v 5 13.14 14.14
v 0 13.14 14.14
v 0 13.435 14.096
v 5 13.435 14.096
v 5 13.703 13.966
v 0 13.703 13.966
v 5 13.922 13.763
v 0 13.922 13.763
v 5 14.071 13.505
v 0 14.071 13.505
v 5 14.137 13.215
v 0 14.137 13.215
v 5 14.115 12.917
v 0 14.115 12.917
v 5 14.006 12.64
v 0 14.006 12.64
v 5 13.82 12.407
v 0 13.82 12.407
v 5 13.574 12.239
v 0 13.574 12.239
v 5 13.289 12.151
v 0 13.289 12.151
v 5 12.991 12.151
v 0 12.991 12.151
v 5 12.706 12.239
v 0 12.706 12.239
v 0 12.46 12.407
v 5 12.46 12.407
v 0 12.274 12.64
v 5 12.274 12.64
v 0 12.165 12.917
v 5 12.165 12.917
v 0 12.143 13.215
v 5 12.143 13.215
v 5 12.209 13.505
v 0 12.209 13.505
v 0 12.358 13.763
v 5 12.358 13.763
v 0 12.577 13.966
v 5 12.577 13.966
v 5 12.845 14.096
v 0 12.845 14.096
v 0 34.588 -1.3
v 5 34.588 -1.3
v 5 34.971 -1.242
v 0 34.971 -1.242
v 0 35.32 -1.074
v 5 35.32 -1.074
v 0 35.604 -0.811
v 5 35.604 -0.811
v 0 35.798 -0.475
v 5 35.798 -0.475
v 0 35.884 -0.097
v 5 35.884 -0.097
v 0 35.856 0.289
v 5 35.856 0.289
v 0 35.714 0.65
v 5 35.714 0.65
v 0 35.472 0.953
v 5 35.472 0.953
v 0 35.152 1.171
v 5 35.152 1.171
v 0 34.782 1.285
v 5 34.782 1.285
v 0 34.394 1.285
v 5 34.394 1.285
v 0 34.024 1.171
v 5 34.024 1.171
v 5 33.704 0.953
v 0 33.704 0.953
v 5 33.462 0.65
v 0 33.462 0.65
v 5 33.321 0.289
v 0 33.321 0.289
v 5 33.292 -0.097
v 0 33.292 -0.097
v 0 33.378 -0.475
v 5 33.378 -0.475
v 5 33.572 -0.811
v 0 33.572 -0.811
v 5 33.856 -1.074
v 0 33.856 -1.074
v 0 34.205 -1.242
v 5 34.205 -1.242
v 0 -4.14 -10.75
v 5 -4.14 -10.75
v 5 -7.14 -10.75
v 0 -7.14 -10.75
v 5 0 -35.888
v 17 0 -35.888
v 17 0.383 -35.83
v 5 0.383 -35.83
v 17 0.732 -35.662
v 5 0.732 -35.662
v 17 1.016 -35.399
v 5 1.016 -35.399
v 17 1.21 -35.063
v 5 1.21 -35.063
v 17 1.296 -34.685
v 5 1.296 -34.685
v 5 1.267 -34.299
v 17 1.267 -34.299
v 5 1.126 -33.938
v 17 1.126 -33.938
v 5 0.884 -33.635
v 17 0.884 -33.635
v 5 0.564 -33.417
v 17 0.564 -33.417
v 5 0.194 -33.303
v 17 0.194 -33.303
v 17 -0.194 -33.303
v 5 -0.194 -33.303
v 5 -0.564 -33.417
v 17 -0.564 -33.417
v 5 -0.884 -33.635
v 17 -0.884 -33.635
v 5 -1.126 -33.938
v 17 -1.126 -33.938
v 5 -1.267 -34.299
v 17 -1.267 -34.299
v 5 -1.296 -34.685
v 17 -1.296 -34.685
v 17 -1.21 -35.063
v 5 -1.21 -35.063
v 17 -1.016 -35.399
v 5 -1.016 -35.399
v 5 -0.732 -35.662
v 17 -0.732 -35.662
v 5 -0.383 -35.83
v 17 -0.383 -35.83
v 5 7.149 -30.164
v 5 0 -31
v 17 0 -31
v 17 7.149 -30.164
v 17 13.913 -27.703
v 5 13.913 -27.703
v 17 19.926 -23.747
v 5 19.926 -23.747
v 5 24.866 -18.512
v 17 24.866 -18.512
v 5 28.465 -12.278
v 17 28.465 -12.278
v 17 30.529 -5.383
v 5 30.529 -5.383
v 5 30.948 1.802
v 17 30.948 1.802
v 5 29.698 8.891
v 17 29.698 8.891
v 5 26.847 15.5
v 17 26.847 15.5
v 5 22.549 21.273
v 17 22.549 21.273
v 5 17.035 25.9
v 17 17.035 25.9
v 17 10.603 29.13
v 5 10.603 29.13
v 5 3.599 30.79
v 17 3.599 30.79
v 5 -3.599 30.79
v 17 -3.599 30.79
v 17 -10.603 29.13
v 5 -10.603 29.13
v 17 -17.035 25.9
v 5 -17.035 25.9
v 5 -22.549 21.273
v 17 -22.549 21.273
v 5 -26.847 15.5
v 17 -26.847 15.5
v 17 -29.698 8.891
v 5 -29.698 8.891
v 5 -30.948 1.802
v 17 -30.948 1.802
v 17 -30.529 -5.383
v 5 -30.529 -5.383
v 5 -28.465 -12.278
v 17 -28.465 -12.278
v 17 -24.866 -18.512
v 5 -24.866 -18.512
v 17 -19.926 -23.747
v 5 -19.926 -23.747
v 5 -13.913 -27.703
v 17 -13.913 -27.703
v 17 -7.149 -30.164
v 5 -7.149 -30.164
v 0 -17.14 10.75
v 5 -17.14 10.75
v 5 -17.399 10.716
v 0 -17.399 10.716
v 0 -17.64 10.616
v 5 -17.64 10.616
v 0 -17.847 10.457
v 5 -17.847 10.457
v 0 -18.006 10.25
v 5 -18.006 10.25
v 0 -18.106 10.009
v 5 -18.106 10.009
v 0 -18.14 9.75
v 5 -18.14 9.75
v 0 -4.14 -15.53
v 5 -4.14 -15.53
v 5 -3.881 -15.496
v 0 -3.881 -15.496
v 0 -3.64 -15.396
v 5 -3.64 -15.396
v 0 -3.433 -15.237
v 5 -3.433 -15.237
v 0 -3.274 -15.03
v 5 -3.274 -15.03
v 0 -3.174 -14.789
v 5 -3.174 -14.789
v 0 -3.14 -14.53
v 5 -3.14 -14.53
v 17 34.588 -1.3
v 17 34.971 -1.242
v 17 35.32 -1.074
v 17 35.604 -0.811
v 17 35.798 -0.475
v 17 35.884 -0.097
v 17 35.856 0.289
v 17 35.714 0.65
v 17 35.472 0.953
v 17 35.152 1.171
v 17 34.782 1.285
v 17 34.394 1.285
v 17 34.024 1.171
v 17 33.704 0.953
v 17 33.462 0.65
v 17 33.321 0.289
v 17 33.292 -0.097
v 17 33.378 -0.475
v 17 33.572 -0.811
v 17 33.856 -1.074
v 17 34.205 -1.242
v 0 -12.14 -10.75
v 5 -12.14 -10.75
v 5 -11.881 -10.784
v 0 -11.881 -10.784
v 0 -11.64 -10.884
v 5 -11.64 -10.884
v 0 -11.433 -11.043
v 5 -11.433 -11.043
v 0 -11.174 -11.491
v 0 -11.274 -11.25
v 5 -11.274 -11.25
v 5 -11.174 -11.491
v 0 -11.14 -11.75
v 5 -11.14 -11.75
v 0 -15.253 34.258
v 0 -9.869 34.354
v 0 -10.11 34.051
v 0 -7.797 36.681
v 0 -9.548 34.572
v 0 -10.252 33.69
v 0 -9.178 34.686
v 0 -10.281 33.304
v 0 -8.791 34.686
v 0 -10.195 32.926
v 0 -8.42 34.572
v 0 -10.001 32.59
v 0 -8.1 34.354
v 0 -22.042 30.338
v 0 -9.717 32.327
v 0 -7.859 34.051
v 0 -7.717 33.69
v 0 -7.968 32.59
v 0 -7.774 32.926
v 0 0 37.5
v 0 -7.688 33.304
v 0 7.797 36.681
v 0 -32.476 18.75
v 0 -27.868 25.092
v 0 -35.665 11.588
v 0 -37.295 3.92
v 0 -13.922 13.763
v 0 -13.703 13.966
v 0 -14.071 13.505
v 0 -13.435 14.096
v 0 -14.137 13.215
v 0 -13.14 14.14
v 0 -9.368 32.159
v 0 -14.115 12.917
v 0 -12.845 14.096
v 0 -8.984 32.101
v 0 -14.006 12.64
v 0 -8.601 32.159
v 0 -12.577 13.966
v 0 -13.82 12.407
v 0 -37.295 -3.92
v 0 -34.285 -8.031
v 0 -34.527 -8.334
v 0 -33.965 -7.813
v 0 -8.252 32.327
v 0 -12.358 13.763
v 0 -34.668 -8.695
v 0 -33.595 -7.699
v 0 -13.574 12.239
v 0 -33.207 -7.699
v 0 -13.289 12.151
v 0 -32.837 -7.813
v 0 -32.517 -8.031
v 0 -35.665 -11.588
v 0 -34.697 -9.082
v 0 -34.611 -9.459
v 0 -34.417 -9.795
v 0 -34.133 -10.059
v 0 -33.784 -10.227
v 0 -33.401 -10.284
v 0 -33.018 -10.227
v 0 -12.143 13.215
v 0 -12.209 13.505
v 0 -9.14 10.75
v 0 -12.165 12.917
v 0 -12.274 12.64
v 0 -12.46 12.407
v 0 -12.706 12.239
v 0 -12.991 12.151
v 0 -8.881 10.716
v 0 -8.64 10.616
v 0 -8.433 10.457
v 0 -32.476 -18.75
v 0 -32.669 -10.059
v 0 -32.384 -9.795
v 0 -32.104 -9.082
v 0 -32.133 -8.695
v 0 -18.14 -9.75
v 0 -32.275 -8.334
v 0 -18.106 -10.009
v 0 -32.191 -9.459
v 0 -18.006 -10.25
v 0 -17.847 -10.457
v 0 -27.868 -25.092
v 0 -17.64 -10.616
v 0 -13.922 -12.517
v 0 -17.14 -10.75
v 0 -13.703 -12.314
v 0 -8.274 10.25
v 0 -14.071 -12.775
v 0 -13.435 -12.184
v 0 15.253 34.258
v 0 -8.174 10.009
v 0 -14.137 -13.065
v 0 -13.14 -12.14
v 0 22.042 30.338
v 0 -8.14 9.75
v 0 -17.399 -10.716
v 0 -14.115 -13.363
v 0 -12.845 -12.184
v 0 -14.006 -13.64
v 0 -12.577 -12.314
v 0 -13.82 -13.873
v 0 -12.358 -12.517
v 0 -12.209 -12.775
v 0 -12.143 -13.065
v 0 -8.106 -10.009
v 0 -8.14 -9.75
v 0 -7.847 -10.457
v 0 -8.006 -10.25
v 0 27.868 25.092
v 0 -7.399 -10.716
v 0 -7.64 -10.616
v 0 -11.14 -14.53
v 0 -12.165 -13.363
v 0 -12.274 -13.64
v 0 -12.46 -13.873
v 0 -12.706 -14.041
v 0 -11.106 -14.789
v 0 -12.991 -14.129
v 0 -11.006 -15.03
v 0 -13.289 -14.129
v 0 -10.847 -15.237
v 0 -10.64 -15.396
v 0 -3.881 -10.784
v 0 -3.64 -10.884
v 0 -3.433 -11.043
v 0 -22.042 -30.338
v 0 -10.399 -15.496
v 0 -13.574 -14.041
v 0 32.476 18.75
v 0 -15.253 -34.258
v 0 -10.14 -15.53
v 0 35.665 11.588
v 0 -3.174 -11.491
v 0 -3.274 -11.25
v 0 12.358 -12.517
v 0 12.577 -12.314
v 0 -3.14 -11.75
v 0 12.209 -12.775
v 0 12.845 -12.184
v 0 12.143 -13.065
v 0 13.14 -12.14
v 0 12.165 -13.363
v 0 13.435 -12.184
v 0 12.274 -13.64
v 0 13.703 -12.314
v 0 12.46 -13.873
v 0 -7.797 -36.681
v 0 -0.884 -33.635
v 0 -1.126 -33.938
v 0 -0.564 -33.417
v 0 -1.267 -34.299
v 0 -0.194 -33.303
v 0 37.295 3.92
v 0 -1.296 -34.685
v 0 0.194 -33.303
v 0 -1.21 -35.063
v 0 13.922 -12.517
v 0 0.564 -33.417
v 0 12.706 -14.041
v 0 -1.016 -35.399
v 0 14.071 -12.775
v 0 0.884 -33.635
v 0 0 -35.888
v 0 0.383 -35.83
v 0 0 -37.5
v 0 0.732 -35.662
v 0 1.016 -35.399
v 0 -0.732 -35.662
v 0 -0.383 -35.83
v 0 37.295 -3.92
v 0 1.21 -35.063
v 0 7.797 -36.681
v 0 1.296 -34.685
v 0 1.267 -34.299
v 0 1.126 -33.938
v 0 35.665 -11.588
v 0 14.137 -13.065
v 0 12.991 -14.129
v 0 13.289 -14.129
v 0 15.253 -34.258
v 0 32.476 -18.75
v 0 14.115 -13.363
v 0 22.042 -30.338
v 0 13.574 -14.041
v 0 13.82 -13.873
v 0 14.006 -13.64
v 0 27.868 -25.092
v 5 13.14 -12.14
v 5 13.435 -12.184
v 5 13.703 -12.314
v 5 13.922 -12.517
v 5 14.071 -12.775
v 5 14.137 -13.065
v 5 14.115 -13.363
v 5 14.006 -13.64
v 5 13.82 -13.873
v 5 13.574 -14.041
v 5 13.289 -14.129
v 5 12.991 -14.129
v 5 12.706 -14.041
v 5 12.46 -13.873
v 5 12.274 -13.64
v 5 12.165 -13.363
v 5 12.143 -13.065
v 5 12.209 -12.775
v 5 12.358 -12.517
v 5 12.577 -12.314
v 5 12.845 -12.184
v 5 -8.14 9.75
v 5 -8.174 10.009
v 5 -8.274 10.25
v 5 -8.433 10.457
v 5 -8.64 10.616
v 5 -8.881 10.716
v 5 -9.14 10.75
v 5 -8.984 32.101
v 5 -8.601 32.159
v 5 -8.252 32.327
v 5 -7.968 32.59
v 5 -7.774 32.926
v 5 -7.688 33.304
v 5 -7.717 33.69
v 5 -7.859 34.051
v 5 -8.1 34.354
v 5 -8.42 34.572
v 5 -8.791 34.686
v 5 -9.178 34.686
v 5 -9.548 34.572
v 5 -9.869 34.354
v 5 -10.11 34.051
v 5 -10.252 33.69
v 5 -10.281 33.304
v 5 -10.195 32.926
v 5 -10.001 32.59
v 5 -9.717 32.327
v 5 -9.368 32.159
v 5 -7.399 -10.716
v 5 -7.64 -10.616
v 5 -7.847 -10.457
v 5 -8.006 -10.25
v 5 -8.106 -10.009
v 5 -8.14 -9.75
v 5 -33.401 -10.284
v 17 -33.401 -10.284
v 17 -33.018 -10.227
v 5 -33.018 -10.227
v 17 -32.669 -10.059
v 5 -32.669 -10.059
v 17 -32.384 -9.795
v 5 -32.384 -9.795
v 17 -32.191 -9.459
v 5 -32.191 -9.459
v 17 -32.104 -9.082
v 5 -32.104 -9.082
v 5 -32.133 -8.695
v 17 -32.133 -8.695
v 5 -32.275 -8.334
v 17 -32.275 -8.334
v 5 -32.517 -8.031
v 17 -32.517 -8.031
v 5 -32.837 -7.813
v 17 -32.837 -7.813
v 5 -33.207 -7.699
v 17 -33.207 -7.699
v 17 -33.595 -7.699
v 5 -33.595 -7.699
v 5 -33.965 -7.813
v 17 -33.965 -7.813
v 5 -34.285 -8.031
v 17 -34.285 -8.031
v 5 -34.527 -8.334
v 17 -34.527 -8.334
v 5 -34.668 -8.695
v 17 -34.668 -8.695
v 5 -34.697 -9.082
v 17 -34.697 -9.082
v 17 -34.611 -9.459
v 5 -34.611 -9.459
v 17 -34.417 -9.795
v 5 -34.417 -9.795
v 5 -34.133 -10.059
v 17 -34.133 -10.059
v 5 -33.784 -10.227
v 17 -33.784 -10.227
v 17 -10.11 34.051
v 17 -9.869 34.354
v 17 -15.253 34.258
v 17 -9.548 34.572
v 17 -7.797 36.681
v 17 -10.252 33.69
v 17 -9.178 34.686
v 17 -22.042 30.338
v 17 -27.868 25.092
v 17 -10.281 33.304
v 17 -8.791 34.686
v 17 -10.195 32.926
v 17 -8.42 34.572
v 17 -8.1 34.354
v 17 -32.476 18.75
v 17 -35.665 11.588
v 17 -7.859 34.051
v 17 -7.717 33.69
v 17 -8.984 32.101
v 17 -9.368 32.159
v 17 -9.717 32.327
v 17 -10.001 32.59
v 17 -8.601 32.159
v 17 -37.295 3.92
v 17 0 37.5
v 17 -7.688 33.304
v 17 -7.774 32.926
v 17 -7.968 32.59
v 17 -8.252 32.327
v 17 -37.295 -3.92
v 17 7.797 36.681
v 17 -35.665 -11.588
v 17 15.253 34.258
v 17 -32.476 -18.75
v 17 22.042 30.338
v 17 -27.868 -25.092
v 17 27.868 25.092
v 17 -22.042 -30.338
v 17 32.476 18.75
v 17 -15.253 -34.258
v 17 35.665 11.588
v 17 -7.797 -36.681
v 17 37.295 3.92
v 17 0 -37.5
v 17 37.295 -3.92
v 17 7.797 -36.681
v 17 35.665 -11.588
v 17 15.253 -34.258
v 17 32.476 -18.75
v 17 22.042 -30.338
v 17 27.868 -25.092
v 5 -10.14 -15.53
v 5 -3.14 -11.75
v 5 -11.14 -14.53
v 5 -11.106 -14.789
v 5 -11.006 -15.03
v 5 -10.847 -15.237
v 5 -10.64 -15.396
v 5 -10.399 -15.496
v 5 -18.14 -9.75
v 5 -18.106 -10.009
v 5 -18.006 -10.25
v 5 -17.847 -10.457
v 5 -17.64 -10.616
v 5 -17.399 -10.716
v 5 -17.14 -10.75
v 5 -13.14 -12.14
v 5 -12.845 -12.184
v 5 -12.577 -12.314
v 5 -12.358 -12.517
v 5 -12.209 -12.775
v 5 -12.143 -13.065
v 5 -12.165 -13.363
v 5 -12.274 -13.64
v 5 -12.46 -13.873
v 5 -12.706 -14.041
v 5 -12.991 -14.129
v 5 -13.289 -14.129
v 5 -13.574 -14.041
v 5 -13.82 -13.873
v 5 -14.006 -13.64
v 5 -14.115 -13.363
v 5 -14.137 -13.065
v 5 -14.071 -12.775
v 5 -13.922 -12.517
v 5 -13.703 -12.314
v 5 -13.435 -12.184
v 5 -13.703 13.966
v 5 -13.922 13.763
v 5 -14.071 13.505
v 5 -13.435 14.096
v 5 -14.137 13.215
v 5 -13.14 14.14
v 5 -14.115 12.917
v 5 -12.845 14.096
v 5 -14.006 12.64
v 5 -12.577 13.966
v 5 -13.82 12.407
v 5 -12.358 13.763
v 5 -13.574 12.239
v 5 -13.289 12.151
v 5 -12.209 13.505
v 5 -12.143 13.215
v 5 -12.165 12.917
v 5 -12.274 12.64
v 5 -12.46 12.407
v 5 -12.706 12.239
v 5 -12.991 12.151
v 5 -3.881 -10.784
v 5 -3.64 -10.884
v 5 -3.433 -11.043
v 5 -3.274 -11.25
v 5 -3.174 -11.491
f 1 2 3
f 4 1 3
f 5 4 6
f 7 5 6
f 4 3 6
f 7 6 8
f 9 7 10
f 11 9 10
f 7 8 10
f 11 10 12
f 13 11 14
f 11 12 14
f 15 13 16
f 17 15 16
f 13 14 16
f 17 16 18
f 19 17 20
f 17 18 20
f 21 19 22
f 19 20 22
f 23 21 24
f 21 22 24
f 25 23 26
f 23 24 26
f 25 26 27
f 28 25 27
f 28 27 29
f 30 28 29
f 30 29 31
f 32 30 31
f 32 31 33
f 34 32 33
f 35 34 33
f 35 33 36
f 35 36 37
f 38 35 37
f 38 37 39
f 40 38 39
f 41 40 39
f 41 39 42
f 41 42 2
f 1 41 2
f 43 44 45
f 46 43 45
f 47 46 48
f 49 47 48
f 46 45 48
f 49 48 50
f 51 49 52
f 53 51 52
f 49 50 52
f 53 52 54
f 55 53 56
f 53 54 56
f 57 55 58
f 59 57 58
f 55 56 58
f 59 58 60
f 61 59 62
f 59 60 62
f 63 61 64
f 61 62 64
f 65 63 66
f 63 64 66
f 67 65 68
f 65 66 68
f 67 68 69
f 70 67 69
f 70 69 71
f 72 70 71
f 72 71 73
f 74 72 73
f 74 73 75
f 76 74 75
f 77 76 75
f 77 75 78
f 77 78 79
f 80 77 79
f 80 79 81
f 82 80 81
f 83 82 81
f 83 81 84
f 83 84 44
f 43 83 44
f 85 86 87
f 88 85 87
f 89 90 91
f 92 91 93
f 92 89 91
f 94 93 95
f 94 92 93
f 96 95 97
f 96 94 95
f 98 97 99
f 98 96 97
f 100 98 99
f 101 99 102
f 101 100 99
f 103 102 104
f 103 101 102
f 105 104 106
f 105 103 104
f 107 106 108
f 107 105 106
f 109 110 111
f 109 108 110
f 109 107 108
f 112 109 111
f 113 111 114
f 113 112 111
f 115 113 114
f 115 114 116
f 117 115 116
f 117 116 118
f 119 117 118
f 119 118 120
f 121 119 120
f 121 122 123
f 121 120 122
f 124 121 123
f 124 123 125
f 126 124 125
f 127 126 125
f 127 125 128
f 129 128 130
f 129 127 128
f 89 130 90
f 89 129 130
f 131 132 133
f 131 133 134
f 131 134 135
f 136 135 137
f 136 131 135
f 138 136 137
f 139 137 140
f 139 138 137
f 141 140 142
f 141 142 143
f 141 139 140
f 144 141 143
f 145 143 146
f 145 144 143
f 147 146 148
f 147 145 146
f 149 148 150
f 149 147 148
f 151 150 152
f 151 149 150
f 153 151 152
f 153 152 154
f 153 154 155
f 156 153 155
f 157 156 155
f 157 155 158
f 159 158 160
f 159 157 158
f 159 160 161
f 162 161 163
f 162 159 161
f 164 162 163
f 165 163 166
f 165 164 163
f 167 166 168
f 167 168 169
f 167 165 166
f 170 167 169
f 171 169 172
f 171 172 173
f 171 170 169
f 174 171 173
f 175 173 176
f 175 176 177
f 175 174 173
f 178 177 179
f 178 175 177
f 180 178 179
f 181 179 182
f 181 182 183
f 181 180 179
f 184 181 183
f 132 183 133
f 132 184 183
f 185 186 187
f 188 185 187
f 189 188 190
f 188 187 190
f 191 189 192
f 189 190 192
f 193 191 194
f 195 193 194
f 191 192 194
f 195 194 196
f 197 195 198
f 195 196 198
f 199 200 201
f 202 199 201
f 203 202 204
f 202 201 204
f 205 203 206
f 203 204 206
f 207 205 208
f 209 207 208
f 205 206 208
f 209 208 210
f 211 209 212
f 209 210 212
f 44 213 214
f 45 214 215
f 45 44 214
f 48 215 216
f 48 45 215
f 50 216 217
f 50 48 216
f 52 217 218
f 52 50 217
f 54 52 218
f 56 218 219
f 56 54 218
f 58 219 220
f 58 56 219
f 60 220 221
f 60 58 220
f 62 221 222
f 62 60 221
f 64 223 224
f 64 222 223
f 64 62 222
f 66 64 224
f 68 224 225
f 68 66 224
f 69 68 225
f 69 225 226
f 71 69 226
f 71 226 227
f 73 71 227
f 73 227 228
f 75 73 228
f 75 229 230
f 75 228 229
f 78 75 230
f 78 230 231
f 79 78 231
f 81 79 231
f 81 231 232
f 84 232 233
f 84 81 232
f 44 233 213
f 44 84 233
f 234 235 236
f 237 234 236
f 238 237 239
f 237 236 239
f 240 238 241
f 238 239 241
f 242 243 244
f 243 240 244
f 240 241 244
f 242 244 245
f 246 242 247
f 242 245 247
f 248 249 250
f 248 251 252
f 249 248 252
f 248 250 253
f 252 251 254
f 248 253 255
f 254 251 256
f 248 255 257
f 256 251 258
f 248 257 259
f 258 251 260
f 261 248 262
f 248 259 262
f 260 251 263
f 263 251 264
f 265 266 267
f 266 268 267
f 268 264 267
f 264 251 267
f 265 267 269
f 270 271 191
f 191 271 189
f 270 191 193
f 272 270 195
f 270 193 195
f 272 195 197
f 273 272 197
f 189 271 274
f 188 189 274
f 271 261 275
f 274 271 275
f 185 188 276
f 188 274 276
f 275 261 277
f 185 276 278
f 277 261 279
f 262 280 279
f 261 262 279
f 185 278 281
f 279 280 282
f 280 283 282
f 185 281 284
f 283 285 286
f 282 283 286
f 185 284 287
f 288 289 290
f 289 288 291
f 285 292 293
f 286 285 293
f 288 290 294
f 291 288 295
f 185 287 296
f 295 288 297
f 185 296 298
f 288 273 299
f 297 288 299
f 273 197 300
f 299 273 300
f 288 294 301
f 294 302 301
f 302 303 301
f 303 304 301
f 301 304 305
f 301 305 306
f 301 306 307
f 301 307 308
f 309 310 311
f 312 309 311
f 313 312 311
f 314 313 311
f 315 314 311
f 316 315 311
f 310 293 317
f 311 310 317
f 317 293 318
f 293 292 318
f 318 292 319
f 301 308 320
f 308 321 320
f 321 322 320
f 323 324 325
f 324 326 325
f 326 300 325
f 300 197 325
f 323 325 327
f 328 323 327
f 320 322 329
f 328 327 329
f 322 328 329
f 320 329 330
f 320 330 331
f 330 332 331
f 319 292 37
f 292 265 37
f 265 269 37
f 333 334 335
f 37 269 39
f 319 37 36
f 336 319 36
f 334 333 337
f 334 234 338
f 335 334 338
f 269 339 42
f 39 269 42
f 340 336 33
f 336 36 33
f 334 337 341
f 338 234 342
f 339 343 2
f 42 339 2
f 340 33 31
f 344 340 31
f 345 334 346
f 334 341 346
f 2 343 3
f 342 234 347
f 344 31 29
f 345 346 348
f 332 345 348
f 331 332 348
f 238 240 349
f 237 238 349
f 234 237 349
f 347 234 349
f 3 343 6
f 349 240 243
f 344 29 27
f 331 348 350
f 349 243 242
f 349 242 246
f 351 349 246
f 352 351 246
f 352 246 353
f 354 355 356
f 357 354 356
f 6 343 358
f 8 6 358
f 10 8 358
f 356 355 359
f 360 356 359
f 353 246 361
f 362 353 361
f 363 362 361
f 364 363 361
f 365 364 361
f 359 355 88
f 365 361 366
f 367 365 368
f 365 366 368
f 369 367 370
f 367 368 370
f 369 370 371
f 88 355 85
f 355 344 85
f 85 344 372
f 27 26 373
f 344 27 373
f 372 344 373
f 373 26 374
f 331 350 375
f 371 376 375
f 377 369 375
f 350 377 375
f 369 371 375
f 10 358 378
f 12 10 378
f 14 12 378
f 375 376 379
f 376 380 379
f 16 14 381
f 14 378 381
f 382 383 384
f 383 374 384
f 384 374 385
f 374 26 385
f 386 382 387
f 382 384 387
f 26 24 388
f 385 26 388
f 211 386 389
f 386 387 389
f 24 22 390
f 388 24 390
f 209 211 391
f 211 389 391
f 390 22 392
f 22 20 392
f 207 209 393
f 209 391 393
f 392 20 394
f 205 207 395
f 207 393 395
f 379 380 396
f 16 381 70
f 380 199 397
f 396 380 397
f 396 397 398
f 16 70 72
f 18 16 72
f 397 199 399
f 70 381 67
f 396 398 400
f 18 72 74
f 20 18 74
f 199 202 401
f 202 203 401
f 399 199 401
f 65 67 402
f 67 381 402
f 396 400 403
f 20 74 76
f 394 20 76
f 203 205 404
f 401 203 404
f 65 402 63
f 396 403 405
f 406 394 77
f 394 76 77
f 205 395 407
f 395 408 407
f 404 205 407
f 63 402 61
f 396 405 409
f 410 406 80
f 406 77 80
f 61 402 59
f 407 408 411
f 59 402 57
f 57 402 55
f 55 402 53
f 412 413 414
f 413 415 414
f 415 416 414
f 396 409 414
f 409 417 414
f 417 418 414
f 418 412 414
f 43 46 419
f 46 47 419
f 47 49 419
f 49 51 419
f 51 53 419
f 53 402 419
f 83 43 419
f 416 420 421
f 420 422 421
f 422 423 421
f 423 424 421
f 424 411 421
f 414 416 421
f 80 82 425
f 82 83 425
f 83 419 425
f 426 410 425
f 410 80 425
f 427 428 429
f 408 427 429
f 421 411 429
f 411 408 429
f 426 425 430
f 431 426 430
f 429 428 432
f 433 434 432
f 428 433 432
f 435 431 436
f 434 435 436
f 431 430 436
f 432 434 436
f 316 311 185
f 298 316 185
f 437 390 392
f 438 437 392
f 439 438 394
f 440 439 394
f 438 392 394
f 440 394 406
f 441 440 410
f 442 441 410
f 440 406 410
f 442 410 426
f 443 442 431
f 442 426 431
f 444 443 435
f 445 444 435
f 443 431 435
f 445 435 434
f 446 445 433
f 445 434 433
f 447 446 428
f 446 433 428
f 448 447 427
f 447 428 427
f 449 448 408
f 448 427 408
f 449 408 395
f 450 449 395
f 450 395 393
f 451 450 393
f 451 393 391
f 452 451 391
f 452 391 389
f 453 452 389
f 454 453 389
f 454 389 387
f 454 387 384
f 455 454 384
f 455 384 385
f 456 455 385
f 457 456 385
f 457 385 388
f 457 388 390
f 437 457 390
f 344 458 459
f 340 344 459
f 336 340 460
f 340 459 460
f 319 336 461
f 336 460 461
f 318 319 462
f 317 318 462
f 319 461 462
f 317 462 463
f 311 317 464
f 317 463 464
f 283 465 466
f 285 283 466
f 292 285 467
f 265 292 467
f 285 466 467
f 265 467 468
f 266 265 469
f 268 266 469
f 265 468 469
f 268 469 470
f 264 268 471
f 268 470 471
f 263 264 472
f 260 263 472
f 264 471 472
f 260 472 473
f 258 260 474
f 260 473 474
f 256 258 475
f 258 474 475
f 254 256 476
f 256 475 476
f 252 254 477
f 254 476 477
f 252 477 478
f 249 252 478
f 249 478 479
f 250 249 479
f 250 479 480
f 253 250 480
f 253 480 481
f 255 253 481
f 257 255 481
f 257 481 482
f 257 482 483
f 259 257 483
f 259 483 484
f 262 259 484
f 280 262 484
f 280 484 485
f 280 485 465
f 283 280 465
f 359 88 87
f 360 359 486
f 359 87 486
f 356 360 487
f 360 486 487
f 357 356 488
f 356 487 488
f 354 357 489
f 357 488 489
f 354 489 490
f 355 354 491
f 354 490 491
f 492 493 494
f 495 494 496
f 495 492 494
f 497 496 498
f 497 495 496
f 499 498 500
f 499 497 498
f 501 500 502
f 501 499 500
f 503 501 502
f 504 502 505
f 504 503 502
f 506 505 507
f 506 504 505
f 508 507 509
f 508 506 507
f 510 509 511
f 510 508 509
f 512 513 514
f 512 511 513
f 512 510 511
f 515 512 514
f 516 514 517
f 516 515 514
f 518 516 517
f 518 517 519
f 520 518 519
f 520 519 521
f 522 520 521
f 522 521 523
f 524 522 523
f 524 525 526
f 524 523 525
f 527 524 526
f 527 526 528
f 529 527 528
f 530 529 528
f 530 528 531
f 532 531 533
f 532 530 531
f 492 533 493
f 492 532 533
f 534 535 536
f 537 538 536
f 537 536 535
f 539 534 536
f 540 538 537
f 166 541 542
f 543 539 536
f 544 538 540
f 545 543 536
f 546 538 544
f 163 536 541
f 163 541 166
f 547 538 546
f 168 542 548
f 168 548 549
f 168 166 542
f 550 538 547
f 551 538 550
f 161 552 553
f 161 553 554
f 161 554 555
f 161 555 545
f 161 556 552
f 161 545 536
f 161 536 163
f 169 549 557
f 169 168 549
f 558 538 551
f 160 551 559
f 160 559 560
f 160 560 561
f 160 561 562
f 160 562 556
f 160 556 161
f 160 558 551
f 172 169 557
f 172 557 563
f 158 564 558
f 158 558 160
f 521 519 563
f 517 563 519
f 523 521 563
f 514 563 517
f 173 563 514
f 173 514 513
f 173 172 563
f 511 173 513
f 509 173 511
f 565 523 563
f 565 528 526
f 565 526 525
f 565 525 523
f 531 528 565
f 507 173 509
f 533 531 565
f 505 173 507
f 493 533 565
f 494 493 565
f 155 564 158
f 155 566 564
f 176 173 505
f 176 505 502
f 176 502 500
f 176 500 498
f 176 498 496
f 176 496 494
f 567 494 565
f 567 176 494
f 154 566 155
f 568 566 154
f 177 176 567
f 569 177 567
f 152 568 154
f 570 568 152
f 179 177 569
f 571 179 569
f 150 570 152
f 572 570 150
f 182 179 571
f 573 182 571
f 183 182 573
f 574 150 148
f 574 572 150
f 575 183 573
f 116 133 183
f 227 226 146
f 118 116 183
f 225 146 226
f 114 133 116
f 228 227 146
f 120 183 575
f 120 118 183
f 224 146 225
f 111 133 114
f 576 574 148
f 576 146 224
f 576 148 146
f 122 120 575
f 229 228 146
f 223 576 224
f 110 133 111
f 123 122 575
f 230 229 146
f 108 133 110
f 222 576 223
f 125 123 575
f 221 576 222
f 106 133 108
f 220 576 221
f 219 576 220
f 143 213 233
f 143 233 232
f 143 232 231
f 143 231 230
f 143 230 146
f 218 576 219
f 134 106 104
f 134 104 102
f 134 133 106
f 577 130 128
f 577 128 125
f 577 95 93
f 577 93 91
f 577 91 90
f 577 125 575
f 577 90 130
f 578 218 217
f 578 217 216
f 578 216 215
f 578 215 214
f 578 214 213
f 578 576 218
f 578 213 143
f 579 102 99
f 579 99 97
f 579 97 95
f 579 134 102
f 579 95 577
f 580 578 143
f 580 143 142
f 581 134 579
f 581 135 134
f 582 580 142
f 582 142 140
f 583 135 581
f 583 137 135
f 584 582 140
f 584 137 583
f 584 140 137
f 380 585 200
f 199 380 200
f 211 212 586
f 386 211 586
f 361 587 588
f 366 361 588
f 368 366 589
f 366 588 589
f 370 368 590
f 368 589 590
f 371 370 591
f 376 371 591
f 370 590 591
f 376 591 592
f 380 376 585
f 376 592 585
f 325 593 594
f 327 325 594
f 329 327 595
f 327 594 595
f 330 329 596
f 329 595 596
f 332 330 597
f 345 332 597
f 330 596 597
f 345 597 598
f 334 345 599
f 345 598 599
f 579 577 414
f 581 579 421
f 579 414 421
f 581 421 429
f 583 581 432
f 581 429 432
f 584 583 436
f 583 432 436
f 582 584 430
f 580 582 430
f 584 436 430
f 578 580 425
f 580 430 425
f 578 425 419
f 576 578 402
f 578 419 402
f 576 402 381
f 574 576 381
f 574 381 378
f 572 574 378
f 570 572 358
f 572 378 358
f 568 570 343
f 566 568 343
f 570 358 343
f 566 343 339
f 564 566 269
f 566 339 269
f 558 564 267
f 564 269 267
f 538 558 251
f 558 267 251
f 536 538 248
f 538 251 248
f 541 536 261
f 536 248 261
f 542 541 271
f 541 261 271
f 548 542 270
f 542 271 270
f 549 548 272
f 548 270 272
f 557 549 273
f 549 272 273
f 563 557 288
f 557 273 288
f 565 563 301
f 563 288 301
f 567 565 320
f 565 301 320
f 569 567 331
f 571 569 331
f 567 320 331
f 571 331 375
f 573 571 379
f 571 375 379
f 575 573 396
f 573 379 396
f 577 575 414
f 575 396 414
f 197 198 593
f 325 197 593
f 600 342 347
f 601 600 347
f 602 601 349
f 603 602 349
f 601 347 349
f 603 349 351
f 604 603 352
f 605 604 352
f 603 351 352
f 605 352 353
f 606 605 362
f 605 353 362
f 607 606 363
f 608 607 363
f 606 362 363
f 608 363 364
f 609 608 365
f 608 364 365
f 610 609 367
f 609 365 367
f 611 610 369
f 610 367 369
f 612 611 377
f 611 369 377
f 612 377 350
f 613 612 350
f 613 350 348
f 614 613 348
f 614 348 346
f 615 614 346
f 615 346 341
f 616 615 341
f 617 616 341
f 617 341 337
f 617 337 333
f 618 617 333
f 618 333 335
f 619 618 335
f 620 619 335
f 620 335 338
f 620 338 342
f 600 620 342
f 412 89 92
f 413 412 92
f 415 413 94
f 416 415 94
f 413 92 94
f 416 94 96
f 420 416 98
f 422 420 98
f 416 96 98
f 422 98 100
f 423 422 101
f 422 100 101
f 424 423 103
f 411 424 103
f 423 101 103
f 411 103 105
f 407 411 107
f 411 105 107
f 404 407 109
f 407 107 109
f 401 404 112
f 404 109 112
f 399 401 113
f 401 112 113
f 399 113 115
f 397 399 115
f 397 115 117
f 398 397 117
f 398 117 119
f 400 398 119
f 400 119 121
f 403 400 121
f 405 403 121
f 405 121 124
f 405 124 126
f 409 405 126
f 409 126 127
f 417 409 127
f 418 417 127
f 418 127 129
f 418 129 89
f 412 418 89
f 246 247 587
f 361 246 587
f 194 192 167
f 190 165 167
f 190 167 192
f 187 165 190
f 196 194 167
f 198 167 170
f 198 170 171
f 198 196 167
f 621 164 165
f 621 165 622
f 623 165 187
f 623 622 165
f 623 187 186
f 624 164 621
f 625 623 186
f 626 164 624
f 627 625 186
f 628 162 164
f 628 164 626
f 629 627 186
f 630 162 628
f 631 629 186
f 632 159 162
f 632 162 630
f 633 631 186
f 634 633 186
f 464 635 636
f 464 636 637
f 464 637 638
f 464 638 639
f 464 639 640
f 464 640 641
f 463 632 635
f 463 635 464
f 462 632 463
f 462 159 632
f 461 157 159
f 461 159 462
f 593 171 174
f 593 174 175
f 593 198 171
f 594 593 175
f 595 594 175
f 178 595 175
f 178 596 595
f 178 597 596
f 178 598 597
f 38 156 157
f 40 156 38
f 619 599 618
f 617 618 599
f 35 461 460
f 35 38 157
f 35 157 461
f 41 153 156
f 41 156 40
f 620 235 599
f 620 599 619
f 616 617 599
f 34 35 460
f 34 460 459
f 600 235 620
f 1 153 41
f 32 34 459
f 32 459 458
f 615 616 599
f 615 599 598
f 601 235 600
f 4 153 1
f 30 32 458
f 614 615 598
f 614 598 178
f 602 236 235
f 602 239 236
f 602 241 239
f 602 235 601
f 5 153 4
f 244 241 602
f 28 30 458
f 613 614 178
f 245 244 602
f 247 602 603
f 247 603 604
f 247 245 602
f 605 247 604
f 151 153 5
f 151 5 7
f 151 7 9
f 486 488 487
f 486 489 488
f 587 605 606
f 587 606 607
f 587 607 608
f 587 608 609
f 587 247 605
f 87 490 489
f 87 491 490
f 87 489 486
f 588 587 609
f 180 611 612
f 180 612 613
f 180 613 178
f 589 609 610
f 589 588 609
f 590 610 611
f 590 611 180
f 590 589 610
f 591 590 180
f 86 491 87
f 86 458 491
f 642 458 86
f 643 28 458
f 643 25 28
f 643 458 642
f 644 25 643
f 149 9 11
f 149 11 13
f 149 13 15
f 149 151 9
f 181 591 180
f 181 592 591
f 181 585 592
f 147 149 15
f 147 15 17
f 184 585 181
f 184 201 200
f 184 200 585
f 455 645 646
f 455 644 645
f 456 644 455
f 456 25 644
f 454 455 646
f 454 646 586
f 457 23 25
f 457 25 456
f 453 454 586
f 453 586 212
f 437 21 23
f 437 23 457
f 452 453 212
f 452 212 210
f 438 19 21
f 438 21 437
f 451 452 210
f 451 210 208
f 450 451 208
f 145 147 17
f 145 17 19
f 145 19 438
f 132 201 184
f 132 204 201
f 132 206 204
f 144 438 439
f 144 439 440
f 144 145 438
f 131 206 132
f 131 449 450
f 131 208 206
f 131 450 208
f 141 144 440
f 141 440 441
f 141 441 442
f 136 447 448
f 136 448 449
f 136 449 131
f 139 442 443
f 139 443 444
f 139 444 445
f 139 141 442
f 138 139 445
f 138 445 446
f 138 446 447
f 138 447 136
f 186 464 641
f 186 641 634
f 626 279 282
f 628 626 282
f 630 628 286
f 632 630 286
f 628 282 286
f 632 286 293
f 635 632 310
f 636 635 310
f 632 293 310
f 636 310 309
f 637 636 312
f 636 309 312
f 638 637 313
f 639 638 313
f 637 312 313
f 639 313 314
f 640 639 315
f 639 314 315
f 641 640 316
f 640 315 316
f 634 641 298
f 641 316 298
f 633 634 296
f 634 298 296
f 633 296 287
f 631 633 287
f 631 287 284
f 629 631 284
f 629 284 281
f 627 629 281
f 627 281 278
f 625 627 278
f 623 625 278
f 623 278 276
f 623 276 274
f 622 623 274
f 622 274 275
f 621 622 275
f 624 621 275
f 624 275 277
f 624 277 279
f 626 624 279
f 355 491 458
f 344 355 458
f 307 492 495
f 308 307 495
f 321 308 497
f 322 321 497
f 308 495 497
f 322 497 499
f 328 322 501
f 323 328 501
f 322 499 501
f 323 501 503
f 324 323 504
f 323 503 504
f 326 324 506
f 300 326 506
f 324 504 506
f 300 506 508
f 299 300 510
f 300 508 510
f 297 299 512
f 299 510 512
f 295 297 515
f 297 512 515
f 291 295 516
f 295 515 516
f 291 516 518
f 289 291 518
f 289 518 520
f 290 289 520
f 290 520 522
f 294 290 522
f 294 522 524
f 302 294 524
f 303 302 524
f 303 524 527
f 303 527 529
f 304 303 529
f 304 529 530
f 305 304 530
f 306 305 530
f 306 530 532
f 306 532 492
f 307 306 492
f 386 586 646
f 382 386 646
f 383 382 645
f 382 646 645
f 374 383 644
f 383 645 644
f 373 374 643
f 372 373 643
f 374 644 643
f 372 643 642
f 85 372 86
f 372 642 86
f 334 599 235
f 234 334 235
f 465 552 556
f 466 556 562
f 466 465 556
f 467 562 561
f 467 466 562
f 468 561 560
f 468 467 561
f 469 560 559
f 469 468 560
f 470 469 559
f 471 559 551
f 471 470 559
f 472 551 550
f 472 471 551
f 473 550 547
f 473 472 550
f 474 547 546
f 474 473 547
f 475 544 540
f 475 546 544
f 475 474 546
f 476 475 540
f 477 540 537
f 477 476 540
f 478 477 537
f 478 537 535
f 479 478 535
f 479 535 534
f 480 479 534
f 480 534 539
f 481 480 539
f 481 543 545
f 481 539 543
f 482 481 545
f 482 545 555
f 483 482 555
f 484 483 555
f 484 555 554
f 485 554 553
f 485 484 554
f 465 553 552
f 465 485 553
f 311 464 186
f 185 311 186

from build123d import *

# Parameters (mm, degrees)
SKETCH1_R               = 37.5
BOSS_EXTRUDE1_DEPTH     = 5
SKETCH3_R               = 1
CUT_EXTRUDE2_DEPTH      = 6
SKETCH4_R               = 37.5
SKETCH4_R_2             = 31
BOSS_EXTRUDE2_DEPTH     = 12
SKETCH2_R               = 1.3
CUT_EXTRUDE1_DEPTH      = 13
CUT_EXTRUDE1_DEPTH_BACK = 6
CUT_EXTRUDE3_DEPTH      = 6


with BuildPart() as part:
    # Sketch1 → Boss-Extrude1 (new body)
    with BuildSketch(Plane(origin=(0, 0, 0), x_dir=(0, 0, -1), z_dir=(1, 0, 0))):
        Circle(SKETCH1_R)
    extrude(amount=BOSS_EXTRUDE1_DEPTH)

    # Sketch3 → Cut-Extrude2 (cut, through all)
    with BuildSketch(Plane.ZY):
        with Locations((-13.14, 13.14)):
            Circle(SKETCH3_R)
        with Locations((13.14, 13.14)):
            Circle(SKETCH3_R)
        with Locations((13.14, -13.14)):
            Circle(SKETCH3_R)
        with Locations((-13.14, -13.14)):
            Circle(SKETCH3_R)
    extrude(amount=-CUT_EXTRUDE2_DEPTH, mode=Mode.SUBTRACT)

    # Sketch4 → Boss-Extrude2 (add)
    with BuildSketch(Plane(origin=(5, 0, 0), x_dir=(0, 0, -1), z_dir=(1, 0, 0))):
        Circle(SKETCH4_R)
        Circle(SKETCH4_R_2, mode=Mode.SUBTRACT)
    extrude(amount=BOSS_EXTRUDE2_DEPTH)

    # Sketch2 → Cut-Extrude1 (cut, two sides)
    with BuildSketch(Plane(origin=(5, 0, 0), x_dir=(0, 0, -1), z_dir=(1, 0, 0))) as cut_extrude1_sk:
        with Locations((0, 34.588098227)):
            Circle(SKETCH2_R)
        with Locations((8.984441127, -33.400843651)):
            Circle(SKETCH2_R)
        with Locations((34.588098227, 0)):
            Circle(SKETCH2_R)
        with Locations((-33.400843651, -8.984441127)):
            Circle(SKETCH2_R)
    extrude(amount=CUT_EXTRUDE1_DEPTH, mode=Mode.SUBTRACT)
    extrude(cut_extrude1_sk.sketch, amount=-CUT_EXTRUDE1_DEPTH_BACK, mode=Mode.SUBTRACT)

    # Sketch5 → Cut-Extrude3 (cut, through all)
    with BuildSketch(Plane(origin=(5, 0, 0), x_dir=(0, 0, -1), z_dir=(1, 0, 0))):
        with BuildLine():
            Line((9.75, -8.14), (-9.75, -8.14))
            ThreePointArc((-9.75, -8.14), (-10.457106781, -8.432893219), (-10.75, -9.14))
            Line((-10.75, -9.14), (-10.75, -17.14))
            ThreePointArc((-10.75, -17.14), (-10.457106781, -17.847106781), (-9.75, -18.14))
            Line((-9.75, -18.14), (9.75, -18.14))
            ThreePointArc((9.75, -18.14), (10.457106781, -17.847106781), (10.75, -17.14))
            Line((10.75, -17.14), (10.75, -12.14))
            ThreePointArc((10.75, -12.14), (11.042893219, -11.432893219), (11.75, -11.14))
            Line((11.75, -11.14), (14.53, -11.14))
            ThreePointArc((14.53, -11.14), (15.237106781, -10.847106781), (15.53, -10.14))
            Line((15.53, -10.14), (15.53, -4.14))
            ThreePointArc((15.53, -4.14), (15.237106781, -3.432893219), (14.53, -3.14))
            Line((14.53, -3.14), (11.75, -3.14))
            ThreePointArc((11.75, -3.14), (11.042893219, -3.432893219), (10.75, -4.14))
            Line((10.75, -4.14), (10.75, -7.14))
            ThreePointArc((10.75, -7.14), (10.457106781, -7.847106781), (9.75, -8.14))
        make_face()
    extrude(amount=-CUT_EXTRUDE3_DEPTH, mode=Mode.SUBTRACT)


solid = part.part
